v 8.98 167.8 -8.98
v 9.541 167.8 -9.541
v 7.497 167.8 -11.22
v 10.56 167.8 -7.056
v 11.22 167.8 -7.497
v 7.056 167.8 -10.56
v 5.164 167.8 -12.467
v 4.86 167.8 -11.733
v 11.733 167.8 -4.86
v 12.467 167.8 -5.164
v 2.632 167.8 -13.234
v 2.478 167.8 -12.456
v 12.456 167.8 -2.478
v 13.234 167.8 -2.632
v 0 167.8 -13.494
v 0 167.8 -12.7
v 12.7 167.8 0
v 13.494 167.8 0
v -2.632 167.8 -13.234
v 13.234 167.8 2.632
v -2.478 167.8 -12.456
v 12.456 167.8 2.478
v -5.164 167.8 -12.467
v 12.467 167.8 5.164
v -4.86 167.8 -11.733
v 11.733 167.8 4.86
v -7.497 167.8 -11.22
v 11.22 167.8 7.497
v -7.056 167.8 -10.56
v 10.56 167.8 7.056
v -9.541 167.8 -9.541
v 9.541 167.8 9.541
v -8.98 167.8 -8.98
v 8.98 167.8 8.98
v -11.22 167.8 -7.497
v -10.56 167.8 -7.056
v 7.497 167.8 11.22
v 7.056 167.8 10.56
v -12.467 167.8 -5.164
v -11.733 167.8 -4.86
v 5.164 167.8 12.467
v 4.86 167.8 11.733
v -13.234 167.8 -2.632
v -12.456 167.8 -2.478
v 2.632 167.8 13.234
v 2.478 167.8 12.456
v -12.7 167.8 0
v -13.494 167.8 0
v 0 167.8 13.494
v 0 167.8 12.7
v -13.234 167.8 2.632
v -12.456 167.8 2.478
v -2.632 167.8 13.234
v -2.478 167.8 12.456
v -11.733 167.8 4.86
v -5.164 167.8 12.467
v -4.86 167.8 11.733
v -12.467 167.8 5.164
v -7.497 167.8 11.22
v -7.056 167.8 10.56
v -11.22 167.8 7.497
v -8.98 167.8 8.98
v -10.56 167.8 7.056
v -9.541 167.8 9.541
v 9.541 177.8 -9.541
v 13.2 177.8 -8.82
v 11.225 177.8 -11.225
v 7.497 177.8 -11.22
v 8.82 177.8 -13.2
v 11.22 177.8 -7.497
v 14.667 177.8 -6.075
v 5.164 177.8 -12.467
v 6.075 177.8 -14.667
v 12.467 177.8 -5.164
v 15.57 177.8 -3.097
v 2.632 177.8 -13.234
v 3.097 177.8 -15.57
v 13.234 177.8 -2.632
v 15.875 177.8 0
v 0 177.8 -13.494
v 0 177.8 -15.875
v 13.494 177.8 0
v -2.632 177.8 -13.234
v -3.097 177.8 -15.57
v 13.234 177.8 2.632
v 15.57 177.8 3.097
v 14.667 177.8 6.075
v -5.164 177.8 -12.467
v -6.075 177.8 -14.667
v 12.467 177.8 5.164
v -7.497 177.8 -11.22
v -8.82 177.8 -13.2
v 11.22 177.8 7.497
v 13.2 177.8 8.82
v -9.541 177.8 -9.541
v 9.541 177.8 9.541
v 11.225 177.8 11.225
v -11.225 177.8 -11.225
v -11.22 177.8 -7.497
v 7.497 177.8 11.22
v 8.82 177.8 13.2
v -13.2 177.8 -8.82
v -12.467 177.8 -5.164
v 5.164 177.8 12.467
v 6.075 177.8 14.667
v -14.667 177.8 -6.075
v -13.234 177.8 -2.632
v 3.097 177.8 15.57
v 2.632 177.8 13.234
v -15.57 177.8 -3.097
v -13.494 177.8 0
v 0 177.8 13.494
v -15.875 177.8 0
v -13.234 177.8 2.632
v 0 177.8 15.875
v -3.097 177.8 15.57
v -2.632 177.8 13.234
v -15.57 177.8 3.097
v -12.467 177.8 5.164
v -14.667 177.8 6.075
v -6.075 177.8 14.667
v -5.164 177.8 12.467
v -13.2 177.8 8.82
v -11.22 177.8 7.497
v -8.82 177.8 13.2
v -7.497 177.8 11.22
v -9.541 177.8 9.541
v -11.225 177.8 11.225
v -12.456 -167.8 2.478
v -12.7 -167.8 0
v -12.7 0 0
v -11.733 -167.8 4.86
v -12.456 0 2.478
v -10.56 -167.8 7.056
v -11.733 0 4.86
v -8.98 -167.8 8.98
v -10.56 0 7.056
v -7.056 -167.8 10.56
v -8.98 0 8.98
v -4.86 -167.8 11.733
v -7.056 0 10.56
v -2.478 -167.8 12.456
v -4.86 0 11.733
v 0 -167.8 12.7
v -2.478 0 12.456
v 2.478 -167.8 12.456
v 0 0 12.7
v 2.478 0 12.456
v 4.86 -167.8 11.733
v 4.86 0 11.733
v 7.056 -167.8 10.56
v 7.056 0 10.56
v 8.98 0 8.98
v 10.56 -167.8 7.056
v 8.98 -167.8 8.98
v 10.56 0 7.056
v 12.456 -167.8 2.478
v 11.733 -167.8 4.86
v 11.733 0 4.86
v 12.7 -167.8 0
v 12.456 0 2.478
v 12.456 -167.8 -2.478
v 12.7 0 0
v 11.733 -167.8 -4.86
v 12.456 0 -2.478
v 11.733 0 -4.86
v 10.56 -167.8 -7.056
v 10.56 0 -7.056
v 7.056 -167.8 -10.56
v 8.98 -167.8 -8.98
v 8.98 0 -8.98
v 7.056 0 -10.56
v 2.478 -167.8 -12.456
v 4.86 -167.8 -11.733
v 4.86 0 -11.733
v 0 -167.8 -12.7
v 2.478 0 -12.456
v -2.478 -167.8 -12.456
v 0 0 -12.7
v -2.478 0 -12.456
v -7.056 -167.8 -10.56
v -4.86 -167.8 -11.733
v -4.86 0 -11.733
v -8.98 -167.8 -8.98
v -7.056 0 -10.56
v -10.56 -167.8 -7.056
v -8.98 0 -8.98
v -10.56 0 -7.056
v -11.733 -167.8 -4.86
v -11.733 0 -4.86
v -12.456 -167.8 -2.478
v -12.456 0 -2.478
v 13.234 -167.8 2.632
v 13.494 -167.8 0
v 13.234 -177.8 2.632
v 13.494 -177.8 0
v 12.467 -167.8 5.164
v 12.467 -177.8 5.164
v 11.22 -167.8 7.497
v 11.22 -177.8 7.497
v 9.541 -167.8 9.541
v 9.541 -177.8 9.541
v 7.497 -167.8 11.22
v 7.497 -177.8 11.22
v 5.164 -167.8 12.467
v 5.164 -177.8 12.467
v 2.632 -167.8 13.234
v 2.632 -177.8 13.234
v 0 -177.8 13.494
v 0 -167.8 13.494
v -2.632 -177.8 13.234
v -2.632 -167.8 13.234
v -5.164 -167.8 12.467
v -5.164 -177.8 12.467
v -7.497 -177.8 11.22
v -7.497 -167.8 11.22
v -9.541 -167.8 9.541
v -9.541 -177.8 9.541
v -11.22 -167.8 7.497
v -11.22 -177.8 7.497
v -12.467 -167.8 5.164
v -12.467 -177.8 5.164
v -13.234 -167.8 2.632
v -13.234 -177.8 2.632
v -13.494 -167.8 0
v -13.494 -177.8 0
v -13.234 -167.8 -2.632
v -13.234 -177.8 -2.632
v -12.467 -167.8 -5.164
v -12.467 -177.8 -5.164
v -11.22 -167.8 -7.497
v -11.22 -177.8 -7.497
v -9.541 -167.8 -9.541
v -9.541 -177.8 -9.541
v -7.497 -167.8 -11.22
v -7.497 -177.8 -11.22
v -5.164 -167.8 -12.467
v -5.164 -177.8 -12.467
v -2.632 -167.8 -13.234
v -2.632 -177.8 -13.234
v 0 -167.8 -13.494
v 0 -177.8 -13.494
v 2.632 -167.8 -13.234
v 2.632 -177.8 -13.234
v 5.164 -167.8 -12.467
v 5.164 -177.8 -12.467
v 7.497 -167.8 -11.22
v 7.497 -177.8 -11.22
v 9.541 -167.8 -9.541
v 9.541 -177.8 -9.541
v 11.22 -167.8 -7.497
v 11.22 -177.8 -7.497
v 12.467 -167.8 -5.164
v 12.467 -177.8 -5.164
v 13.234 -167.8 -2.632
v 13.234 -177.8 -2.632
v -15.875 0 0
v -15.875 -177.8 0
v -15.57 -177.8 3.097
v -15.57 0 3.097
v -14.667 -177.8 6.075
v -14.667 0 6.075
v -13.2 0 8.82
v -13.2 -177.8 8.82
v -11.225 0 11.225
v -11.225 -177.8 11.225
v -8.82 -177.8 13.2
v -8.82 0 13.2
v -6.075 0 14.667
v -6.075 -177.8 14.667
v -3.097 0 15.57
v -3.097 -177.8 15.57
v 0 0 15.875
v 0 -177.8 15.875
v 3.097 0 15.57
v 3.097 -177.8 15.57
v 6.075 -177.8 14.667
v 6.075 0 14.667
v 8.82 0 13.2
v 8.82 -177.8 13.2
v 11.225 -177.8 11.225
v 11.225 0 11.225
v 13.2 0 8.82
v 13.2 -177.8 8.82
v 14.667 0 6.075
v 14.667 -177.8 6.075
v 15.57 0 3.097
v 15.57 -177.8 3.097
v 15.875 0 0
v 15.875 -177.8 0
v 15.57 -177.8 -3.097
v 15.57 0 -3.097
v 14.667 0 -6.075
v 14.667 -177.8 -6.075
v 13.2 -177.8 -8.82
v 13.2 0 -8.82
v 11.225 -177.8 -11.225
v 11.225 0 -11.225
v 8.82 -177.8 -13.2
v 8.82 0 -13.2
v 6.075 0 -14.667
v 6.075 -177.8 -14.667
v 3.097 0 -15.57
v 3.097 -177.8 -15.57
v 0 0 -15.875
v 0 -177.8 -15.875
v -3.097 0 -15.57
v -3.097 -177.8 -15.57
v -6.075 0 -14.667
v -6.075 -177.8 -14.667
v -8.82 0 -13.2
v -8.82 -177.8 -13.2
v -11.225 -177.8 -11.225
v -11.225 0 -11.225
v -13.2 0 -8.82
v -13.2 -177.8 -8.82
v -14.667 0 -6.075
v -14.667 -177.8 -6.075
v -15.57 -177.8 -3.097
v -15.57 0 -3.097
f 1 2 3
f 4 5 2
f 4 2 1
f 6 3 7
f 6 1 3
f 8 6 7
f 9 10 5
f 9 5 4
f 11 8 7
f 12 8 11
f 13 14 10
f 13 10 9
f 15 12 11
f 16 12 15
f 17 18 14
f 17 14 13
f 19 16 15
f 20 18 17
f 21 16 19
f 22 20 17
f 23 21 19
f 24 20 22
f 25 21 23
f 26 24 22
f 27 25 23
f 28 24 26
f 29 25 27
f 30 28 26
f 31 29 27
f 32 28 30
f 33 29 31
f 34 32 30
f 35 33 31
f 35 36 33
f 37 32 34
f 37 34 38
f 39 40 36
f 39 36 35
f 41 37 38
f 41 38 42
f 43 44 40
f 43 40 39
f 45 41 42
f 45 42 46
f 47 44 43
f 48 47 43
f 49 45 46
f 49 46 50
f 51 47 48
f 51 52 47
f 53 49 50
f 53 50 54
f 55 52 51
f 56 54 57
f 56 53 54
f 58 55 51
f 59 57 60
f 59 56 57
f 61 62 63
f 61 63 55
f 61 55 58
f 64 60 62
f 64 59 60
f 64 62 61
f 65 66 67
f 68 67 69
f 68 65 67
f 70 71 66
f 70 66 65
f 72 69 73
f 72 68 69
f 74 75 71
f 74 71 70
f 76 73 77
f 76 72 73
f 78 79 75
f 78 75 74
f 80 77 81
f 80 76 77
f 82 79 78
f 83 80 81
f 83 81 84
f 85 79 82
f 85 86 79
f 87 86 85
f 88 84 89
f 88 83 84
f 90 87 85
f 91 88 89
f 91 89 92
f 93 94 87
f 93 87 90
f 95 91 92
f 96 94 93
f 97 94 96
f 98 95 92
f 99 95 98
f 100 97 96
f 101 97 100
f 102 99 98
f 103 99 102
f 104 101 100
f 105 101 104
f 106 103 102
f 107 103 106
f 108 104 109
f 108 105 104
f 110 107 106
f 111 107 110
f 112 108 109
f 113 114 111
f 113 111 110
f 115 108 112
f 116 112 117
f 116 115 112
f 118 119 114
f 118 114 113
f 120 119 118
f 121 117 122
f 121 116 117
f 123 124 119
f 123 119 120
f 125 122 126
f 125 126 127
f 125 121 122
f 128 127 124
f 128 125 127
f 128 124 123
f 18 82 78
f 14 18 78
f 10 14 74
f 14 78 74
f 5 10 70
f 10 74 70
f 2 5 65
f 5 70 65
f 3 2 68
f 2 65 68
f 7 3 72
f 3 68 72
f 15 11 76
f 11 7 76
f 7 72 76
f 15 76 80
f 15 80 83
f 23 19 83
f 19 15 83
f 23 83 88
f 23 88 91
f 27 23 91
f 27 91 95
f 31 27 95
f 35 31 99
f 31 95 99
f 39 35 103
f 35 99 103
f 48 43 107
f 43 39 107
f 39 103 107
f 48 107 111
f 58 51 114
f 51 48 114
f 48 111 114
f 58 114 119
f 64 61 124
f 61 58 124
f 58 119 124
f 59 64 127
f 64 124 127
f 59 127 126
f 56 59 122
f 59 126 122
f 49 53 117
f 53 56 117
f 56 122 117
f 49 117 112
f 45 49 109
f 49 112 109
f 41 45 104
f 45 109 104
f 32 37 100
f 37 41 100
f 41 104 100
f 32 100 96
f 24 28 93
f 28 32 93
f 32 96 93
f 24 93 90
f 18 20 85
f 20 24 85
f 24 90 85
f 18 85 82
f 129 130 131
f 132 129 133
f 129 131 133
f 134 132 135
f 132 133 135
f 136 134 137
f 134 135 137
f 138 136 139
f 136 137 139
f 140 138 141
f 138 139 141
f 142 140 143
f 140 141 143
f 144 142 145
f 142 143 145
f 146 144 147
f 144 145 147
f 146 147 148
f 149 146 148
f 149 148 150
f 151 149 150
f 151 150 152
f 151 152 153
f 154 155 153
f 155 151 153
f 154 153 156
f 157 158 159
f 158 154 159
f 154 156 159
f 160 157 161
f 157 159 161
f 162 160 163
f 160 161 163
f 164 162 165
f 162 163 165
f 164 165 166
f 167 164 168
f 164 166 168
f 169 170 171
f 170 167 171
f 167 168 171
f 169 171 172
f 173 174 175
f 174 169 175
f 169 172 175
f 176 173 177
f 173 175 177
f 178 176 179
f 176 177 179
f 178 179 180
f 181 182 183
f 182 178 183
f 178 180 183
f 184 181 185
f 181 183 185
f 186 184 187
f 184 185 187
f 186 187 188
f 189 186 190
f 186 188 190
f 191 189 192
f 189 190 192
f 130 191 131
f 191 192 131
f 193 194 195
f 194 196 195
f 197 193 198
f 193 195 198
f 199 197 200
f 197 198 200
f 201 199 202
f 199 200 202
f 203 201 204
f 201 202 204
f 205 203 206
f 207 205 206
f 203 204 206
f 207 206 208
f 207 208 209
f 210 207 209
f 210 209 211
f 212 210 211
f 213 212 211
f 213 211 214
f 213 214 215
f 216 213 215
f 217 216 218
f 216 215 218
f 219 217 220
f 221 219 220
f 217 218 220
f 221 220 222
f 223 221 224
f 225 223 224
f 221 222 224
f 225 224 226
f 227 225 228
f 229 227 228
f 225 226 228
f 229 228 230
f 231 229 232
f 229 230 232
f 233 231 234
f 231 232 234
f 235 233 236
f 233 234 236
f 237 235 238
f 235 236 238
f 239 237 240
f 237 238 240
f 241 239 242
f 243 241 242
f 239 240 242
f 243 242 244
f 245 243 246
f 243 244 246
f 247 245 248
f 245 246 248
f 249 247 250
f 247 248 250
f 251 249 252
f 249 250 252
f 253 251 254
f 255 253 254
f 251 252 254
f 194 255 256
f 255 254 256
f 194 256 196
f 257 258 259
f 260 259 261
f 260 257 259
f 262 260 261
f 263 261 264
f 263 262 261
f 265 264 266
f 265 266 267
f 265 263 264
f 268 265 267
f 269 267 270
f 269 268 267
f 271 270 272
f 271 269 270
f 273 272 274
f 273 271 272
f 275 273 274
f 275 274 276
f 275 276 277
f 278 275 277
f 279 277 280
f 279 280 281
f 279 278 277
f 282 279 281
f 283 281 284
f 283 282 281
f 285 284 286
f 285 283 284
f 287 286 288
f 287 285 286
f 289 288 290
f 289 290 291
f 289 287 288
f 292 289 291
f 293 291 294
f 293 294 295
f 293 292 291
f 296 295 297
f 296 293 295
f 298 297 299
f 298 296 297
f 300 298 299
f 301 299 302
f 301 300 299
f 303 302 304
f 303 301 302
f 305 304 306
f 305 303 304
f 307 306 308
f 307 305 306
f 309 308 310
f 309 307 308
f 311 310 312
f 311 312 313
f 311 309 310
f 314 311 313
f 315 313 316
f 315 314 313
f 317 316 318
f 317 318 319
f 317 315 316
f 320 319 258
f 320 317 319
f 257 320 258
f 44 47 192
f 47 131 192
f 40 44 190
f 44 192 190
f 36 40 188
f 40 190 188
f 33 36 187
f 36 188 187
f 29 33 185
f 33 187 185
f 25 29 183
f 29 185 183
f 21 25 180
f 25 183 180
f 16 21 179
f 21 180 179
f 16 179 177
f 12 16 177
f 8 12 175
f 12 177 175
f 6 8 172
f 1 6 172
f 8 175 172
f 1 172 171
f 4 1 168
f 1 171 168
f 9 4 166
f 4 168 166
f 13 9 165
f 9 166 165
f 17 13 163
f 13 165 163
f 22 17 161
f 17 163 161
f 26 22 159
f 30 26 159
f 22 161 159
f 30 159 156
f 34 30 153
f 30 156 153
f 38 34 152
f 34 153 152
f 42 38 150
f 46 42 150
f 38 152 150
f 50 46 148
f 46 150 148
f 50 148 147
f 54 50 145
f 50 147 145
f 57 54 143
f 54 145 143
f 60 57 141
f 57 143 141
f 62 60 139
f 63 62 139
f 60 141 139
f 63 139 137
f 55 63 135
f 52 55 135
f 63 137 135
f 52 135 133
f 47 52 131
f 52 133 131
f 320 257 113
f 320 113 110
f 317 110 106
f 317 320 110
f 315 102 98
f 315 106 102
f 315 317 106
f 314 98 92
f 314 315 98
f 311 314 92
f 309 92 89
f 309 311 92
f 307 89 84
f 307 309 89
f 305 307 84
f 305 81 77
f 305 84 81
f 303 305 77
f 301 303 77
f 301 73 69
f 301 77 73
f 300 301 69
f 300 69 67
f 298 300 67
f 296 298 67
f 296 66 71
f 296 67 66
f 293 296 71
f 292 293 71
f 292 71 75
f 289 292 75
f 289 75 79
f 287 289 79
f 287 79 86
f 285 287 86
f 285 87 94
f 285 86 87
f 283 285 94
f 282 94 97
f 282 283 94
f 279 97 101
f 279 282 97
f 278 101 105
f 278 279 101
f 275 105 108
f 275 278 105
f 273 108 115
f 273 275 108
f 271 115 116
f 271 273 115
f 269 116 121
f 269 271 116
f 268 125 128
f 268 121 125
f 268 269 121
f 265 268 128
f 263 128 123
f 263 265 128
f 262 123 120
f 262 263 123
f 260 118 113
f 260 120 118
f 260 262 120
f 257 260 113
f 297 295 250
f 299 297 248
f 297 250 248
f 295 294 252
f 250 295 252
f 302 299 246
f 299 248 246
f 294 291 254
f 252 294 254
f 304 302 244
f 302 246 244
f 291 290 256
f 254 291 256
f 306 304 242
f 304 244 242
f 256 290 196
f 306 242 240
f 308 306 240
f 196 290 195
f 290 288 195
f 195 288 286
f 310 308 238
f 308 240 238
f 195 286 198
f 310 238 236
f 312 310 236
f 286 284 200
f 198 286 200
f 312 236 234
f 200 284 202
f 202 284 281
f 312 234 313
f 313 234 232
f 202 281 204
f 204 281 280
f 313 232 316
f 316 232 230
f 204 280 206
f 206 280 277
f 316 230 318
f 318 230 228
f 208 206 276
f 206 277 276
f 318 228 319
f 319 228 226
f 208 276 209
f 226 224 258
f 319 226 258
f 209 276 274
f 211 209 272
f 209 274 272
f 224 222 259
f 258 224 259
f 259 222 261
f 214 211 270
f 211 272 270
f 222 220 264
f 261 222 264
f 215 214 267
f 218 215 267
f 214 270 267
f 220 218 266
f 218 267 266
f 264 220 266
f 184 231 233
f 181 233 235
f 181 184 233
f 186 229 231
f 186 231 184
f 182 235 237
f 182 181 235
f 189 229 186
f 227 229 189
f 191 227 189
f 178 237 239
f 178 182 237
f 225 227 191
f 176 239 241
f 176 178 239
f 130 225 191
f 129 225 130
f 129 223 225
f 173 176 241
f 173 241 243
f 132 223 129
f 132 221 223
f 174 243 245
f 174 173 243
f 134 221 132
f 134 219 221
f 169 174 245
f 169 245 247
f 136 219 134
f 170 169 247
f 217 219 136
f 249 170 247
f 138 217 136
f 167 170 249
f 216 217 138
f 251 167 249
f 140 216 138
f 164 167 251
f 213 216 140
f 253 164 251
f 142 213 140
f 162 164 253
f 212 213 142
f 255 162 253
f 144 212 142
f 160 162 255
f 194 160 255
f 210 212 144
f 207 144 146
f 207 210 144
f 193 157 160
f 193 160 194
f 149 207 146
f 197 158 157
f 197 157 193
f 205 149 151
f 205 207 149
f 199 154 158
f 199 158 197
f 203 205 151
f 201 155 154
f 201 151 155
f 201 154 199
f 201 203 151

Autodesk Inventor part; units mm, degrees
ref_plane "YZ Plane" through (0, 0, 0) normal (1, 0, 0) x (0, 1, 0)
ref_plane "XZ Plane" through (0, 0, 0) normal (0, 1, 0) x (-1, 0, 0)
ref_plane "XY Plane" through (0, 0, 0) normal (0, 0, 1) x (1, 0, 0)
sketch "Sketch1" plane through (0, 0, 0) normal (0, 1, 0) x (-1, 0, 0)
  circle A0 centre (0, 0) radius 15.875
  circle A1 centre (0, 0) radius 12.7
  dimension "d0" = 31.75
  dimension "d1" = 25.4
extrude "Extrusion1" add sketch "Sketch1" along normal mid plane 355.6
sketch "Sketch2" plane through (0, -177.8, 0) normal (0, -1, 0) x (1, 0, 0)
  circle A0 centre (0, 0) radius 12.7 projected
  circle A1 centre (0, 0) radius 13.4937
  dimension "d4" = 26.9875
extrude "Extrusion2" cut sketch "Sketch2" against normal blind 10
mirror "Mirror1" about plane through (0, 0, 0) normal (0, 1, 0) of "Extrusion2"
properties part number "Acrylic Tube Housing" material "Polycarbonate, Clear"
